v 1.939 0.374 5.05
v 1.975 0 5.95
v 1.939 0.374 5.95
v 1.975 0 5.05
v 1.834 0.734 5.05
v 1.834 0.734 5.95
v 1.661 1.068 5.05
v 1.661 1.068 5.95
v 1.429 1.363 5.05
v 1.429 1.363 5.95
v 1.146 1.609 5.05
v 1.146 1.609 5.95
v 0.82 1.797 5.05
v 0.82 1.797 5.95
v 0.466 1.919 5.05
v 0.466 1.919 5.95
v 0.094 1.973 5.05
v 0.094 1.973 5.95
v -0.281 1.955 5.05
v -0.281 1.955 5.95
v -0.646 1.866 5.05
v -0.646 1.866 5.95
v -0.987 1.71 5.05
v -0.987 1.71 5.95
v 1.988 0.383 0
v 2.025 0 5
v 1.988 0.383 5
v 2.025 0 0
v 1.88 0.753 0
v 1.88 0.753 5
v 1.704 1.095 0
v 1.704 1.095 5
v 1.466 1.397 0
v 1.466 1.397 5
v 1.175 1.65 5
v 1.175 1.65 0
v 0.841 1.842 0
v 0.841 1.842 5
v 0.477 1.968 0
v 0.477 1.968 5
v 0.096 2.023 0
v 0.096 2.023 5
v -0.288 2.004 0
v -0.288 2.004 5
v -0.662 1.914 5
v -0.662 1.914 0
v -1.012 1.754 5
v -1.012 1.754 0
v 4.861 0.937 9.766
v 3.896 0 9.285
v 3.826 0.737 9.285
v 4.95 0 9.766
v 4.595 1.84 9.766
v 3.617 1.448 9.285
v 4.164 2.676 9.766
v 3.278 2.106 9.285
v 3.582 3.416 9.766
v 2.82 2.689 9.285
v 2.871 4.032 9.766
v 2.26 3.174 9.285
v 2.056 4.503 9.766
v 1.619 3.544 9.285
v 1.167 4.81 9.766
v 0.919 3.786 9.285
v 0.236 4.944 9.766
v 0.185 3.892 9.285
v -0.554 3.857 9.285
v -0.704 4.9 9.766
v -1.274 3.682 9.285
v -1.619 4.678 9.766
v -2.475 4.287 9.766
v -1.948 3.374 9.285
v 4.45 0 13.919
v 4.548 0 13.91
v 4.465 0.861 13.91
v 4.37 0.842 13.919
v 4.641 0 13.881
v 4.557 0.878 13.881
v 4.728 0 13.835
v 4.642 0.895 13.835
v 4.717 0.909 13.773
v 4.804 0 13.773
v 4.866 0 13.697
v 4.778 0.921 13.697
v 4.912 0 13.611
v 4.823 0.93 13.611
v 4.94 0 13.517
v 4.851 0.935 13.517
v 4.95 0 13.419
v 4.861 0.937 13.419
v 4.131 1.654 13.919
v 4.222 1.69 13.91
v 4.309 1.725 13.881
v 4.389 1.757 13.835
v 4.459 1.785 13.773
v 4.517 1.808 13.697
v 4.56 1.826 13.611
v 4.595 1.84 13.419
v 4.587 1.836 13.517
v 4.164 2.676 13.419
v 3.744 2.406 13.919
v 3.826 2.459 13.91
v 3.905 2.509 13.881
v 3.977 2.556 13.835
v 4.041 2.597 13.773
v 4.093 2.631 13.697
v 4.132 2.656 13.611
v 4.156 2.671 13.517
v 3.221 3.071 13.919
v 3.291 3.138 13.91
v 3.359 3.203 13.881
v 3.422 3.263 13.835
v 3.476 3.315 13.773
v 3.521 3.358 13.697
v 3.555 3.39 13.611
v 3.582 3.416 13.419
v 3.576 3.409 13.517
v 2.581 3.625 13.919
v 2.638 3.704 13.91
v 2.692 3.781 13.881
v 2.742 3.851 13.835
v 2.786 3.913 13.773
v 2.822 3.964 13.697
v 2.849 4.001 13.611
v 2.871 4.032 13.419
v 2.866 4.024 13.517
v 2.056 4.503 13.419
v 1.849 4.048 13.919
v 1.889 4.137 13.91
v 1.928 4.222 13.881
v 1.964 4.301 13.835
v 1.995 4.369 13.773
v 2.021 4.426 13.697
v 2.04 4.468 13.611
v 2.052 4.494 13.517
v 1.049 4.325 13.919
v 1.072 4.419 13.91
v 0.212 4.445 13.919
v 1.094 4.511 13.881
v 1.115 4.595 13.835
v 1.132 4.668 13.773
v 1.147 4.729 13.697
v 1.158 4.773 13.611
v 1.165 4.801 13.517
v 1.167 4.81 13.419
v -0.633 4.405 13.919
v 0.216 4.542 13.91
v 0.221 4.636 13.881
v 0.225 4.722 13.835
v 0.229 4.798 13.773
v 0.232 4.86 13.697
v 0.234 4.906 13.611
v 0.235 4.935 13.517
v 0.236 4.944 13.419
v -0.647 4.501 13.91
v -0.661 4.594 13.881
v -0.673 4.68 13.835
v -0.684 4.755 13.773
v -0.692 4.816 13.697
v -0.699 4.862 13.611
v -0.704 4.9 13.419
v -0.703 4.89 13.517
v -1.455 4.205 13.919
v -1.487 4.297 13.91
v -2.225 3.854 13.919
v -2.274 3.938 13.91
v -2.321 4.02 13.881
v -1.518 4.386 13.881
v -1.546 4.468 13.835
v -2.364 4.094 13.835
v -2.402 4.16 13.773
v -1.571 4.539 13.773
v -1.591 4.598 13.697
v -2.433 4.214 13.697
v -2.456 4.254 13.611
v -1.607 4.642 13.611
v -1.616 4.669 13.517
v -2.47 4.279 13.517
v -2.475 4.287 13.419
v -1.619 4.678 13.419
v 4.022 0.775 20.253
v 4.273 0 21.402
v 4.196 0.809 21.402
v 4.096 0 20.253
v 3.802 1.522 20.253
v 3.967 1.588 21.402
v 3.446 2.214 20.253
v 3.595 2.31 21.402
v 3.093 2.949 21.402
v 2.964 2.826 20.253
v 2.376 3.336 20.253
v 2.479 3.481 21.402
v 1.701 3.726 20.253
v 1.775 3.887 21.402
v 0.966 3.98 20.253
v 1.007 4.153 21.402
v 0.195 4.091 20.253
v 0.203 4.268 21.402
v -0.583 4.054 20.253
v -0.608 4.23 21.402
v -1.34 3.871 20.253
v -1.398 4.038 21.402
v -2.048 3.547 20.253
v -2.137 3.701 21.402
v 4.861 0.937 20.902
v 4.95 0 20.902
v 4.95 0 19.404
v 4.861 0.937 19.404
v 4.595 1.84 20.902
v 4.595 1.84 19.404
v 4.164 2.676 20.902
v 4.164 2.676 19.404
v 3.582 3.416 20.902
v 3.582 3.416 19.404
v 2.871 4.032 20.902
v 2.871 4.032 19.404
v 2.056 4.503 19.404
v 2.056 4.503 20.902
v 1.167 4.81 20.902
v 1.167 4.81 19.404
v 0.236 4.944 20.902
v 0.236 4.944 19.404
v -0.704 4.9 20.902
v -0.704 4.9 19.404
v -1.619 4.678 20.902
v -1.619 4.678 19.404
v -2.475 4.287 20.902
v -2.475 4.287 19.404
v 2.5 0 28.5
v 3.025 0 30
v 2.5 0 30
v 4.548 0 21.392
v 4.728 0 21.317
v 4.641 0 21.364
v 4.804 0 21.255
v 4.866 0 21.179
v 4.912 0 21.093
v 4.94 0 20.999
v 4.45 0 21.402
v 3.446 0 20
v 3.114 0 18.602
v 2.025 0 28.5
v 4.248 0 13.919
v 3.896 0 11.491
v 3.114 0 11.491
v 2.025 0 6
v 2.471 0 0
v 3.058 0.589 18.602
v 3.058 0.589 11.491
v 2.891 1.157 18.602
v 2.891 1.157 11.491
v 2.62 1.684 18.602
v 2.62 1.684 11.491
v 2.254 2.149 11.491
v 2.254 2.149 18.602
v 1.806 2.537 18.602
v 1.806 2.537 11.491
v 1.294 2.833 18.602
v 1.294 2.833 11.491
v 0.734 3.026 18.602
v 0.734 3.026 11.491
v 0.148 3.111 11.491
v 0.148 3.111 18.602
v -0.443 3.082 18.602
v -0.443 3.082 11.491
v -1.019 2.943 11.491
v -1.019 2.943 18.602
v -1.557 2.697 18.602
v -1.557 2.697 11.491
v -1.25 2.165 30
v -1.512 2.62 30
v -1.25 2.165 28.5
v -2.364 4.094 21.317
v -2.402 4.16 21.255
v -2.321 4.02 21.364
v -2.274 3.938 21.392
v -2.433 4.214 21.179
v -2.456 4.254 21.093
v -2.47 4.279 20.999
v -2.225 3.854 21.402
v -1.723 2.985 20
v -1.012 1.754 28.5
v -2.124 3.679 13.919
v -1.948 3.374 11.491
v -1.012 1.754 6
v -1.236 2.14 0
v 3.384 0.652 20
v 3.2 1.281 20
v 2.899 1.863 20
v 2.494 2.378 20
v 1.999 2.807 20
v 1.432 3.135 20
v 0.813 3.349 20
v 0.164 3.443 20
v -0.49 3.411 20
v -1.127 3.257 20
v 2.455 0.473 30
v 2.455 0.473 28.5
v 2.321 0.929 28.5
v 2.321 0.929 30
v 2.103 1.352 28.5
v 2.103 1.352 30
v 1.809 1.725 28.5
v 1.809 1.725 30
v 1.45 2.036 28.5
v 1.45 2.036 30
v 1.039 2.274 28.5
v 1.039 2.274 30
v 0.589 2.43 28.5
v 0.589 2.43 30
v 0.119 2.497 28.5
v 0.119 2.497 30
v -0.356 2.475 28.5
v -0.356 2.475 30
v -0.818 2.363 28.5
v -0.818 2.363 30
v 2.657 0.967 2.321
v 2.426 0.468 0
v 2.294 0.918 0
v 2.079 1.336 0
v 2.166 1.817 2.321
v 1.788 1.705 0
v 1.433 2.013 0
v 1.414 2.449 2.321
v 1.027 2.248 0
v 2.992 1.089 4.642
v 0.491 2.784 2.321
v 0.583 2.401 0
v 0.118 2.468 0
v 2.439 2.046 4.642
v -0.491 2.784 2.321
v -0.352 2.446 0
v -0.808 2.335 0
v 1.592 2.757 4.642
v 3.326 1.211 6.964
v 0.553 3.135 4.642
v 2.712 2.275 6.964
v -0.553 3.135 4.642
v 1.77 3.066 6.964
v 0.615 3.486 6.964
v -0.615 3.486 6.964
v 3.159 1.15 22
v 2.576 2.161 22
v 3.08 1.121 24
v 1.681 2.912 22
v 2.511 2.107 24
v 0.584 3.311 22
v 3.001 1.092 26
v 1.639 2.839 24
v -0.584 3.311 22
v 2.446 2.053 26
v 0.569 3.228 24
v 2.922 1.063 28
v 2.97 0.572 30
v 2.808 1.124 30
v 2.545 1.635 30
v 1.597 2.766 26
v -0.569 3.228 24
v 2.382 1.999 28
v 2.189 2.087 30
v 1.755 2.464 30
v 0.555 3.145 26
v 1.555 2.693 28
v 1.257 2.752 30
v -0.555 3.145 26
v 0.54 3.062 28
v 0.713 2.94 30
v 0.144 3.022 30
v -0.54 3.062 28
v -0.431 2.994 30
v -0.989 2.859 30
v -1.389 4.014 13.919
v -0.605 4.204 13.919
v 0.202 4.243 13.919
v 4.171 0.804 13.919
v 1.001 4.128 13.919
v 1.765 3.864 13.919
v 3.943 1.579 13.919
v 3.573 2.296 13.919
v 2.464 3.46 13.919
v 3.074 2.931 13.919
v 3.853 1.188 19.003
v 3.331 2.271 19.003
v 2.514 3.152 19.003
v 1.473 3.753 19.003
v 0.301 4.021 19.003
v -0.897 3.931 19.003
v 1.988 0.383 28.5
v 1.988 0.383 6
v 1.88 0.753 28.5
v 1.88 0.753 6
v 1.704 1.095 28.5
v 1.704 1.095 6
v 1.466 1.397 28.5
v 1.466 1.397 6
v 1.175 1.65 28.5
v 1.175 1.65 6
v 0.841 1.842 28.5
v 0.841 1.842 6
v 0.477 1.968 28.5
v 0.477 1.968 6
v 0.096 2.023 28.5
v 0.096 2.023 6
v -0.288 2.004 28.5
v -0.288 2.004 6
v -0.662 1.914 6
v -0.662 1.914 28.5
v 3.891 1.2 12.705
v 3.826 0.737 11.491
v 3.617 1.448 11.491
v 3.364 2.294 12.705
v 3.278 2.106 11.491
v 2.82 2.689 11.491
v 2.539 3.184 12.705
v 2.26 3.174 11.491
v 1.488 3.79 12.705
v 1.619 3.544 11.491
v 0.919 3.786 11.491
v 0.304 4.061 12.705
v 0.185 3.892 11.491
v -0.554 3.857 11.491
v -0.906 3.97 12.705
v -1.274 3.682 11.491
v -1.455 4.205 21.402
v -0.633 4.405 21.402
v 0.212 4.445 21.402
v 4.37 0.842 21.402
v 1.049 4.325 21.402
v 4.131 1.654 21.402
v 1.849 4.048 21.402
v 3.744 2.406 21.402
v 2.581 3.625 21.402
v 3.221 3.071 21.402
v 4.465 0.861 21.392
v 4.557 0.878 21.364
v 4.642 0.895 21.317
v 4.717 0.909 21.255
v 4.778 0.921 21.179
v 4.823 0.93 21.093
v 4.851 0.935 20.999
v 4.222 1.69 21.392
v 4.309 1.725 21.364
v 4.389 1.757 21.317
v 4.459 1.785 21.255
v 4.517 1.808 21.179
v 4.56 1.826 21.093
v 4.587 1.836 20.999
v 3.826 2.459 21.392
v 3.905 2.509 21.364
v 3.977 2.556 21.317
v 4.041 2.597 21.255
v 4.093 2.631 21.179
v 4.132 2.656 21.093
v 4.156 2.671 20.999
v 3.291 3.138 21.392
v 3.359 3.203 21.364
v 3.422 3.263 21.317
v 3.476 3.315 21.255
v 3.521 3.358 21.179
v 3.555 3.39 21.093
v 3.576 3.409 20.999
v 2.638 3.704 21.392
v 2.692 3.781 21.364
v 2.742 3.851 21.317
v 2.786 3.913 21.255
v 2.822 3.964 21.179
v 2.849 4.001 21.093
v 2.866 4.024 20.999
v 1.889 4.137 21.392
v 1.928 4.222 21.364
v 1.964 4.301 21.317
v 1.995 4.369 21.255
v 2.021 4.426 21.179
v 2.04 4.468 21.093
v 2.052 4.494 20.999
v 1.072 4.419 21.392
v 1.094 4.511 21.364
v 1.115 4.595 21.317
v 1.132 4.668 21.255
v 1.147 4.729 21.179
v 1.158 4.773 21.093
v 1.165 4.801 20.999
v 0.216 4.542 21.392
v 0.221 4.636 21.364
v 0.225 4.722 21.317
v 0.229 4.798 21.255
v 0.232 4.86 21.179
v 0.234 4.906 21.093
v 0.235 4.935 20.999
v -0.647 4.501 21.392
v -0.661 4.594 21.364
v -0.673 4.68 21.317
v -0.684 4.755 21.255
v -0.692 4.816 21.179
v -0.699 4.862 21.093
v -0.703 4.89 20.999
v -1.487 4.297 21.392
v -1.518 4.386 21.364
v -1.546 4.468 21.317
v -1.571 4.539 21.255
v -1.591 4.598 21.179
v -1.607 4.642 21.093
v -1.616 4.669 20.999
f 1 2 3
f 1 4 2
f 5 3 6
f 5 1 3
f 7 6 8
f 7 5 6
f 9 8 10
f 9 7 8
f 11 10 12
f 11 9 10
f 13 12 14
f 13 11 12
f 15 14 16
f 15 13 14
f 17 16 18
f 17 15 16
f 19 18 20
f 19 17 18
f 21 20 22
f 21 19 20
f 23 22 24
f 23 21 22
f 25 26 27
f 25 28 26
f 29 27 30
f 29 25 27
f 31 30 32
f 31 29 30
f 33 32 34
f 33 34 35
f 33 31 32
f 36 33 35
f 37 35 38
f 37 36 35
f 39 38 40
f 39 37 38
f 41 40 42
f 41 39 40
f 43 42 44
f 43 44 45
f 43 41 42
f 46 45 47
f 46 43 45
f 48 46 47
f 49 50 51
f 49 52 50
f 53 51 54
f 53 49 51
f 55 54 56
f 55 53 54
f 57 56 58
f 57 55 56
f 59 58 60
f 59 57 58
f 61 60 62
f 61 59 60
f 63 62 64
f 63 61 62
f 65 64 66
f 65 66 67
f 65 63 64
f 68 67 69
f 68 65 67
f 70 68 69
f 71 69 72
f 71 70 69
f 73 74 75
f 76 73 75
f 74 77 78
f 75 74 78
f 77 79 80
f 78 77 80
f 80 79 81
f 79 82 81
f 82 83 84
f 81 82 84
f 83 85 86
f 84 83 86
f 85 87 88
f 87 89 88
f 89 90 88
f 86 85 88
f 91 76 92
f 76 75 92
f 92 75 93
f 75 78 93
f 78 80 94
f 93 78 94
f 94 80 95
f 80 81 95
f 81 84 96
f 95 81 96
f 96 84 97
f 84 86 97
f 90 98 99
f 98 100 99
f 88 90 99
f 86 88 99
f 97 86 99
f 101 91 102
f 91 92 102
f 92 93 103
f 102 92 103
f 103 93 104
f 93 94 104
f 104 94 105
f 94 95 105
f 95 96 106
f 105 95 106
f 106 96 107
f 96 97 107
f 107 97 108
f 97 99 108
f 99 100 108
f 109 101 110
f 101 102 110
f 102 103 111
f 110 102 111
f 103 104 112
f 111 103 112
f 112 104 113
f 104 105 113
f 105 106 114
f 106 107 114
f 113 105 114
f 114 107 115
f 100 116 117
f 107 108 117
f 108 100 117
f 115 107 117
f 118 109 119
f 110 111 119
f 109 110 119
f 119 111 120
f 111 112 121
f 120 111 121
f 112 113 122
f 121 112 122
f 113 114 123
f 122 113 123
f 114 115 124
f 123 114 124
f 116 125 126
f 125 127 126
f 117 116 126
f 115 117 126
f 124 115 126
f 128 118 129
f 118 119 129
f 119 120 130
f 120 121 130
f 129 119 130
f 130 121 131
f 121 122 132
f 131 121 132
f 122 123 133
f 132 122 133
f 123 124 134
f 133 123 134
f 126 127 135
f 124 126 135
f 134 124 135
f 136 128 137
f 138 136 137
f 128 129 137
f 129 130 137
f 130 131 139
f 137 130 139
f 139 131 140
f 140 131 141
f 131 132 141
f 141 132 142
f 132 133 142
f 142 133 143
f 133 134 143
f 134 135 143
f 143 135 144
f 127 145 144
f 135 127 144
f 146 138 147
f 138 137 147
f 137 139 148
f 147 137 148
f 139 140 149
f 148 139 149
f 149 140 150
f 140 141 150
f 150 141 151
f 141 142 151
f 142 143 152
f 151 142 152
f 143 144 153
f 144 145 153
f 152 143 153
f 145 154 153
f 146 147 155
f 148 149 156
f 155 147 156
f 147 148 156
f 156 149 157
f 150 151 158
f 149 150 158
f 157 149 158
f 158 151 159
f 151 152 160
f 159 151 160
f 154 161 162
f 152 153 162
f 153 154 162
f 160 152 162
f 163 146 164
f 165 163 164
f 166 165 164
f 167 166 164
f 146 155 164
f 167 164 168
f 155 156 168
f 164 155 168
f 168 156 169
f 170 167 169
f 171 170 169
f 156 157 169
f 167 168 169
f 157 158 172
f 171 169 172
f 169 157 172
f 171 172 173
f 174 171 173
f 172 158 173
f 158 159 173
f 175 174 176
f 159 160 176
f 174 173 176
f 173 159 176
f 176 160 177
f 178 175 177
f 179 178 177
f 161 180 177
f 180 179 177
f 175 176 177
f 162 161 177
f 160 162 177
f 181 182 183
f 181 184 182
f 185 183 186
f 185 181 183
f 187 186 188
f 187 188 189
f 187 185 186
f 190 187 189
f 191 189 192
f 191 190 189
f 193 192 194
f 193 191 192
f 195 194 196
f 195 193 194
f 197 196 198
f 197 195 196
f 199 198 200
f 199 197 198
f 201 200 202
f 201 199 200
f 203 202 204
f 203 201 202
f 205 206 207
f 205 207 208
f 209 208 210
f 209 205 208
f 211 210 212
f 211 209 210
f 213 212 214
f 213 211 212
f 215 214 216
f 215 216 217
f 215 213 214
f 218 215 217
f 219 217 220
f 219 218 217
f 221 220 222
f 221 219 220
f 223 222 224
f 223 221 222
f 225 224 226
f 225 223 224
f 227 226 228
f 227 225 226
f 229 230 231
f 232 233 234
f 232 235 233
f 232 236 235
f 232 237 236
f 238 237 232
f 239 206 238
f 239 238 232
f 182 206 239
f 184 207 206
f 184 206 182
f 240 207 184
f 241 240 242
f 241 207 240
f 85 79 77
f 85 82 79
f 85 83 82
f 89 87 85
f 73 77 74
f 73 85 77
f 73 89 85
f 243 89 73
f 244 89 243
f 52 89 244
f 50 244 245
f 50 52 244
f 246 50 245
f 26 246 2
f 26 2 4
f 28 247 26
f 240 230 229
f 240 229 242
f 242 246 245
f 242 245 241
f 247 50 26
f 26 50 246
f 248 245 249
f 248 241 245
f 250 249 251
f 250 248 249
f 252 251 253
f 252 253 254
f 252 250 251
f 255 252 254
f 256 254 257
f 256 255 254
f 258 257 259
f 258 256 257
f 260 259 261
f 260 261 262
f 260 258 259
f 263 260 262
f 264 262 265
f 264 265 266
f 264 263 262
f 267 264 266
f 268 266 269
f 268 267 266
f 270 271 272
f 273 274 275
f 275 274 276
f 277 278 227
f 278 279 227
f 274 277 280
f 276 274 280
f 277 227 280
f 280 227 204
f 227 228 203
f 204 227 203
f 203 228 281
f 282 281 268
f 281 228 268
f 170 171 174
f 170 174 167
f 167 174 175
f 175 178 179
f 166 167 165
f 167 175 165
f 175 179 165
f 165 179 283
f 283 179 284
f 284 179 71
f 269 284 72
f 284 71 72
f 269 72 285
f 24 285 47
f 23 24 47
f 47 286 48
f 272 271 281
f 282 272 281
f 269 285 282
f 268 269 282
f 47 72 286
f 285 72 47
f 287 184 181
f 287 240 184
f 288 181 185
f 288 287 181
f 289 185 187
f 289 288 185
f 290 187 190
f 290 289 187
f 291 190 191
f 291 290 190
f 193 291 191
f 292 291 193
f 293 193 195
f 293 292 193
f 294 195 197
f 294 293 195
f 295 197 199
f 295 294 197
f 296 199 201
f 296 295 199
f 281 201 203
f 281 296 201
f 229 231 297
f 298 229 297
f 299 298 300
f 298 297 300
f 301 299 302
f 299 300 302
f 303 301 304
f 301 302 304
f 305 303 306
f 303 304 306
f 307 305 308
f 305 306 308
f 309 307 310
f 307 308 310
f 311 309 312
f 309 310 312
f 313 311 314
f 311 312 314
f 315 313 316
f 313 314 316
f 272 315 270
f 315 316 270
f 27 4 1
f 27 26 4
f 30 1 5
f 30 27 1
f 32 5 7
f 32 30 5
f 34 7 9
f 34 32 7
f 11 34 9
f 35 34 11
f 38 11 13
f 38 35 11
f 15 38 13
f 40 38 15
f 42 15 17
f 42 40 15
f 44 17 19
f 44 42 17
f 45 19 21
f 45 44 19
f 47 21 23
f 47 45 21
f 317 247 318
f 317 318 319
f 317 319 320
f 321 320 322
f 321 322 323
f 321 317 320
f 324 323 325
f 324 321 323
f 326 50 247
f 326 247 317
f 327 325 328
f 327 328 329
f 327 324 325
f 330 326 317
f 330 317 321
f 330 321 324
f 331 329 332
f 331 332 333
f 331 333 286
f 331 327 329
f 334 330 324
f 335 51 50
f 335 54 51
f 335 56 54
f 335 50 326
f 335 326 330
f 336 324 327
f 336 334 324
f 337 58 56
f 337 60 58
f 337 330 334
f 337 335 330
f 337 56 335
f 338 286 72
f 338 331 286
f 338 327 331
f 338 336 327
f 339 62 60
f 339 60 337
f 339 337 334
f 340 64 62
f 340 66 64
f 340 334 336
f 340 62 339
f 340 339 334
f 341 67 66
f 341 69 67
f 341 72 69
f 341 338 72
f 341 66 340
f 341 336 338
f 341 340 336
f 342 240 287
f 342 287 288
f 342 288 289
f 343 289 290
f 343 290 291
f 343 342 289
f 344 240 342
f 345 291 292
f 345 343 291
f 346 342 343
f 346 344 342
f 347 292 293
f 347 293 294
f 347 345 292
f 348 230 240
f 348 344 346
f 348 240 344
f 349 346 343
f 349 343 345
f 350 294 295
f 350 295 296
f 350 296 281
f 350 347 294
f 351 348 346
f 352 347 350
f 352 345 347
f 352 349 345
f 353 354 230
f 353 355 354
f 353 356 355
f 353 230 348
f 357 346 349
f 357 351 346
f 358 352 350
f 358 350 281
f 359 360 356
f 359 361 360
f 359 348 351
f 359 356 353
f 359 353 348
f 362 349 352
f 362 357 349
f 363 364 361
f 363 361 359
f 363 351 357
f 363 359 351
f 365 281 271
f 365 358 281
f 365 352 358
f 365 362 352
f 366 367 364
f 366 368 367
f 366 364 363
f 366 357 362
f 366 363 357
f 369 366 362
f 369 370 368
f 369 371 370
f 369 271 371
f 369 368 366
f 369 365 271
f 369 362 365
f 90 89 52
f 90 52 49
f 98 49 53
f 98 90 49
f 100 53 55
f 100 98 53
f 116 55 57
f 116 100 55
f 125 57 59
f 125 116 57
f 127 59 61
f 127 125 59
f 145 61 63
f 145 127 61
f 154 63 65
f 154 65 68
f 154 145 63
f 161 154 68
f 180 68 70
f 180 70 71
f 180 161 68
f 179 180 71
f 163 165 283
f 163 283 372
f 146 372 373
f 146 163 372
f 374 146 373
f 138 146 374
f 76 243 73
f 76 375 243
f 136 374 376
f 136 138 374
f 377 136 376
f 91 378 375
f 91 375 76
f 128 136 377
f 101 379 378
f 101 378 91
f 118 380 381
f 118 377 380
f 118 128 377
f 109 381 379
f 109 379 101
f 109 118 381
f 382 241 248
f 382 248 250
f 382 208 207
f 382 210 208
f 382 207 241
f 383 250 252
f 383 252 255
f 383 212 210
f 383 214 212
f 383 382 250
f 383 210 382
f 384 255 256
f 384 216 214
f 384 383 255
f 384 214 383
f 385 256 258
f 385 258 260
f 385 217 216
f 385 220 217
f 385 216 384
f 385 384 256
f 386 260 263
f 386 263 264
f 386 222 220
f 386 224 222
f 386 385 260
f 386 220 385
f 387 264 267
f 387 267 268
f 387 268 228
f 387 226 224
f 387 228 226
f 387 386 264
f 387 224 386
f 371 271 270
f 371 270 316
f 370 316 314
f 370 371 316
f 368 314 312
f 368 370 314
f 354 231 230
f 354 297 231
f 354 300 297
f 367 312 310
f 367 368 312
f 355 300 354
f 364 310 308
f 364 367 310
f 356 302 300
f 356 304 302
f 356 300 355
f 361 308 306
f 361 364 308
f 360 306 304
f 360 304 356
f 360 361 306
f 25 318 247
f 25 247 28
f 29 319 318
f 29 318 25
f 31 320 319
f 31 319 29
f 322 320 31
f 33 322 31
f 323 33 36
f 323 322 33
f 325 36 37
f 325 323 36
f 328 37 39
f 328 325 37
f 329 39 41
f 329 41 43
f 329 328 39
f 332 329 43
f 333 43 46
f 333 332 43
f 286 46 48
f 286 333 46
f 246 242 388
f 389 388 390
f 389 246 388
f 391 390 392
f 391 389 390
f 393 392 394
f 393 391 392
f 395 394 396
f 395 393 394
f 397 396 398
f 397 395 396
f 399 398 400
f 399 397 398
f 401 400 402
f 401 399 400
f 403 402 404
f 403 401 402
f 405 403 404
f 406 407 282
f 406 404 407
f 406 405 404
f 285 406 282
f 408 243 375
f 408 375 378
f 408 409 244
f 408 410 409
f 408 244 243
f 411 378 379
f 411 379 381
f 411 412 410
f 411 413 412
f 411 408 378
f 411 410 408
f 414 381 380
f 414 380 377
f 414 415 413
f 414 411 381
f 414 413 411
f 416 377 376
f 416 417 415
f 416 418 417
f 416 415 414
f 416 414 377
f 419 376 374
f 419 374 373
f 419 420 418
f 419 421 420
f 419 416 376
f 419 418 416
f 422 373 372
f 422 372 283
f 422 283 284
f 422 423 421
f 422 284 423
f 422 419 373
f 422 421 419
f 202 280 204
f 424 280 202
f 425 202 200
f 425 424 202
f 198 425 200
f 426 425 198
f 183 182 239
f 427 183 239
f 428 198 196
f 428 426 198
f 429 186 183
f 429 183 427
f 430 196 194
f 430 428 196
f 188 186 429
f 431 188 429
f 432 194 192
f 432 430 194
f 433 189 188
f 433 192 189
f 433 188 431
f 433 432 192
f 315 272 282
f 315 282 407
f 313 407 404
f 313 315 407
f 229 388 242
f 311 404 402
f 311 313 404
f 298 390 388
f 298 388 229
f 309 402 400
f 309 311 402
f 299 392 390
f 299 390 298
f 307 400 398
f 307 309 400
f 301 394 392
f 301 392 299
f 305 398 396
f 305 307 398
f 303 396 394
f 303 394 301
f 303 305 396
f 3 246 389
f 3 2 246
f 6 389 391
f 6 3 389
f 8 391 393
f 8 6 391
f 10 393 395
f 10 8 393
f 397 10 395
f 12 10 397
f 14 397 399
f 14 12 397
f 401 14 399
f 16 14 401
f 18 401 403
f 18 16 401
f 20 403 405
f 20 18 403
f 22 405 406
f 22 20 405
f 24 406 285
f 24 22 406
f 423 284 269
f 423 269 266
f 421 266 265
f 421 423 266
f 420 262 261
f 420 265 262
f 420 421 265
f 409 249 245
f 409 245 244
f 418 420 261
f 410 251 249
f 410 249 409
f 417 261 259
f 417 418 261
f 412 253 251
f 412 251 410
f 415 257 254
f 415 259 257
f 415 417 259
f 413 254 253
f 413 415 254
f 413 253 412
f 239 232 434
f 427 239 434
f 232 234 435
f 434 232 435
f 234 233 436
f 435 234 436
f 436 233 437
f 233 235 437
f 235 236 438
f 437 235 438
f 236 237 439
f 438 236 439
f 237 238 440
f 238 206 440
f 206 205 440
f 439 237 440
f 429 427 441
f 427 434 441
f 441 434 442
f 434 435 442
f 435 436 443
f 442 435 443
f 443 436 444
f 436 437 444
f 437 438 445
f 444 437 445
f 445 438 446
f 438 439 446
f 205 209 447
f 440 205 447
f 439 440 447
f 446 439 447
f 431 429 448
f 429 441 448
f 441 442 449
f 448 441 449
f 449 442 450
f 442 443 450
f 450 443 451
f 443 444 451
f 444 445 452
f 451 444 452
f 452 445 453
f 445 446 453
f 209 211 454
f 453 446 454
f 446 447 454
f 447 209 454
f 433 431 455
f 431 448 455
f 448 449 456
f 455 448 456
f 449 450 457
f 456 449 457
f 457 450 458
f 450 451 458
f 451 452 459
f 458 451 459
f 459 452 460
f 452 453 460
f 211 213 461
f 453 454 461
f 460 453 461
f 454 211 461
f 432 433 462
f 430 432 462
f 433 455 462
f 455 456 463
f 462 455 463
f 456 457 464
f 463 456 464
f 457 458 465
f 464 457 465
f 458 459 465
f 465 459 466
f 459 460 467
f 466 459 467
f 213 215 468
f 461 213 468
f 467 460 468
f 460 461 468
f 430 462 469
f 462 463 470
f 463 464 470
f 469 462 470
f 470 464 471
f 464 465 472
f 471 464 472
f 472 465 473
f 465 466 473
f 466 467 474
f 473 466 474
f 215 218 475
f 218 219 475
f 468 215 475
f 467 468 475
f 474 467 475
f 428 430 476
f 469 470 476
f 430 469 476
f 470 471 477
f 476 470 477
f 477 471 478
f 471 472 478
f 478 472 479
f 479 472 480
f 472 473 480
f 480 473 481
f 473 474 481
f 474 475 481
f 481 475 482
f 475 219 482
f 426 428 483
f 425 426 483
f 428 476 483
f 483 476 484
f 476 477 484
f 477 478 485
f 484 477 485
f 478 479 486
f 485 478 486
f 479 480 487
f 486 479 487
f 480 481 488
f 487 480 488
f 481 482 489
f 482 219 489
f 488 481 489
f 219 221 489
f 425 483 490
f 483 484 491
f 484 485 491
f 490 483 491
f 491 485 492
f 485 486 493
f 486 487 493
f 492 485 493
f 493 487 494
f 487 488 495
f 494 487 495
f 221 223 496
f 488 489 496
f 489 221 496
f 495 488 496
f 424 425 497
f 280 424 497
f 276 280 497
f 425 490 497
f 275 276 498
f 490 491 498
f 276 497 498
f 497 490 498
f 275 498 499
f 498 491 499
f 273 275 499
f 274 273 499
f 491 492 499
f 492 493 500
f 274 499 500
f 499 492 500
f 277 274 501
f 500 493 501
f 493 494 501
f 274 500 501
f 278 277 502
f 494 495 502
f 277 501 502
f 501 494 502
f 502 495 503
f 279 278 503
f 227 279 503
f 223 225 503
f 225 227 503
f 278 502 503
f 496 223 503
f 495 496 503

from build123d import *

# Parameters (mm, degrees)
REVOLVE_1_ANGLE     = 120
SKETCH_3_R          = 2.5
CUT_EXTRUDE_1_DEPTH = 1.5
FILLET_1_R          = 0.5


with BuildPart() as part:
    # 스케치2 → 회전1 (revolve)
    with BuildSketch(Plane(origin=(0, 0, 0), x_dir=(1, 0, 0), z_dir=(0, 1, 0))):
        Polygon((3.025, -30), (2.025, -30), (2.025, -6), (1.975, -5.95), (1.975, -5.05), (2.025, -5), (2.025, 0), (2.471154323, 0), (3.896197522, -9.284948012), (4.95, -9.76632184), (4.95, -13.919413001), (4.247678793, -13.919413001), (3.896197522, -11.490595407), (3.114172222, -11.490595407), (3.114172222, -18.601840787), (4.95, -19.404070604), (4.95, -21.401570634), (4.273015674, -21.401570634), (4.095786722, -20.253069256), (3.446467915, -20), align=None)
    revolve(axis=Axis((0, 0, 0), (0, 0, 1)), revolution_arc=REVOLVE_1_ANGLE)

    # 스케치3 → 컷-돌출1 (cut)
    with BuildSketch(Plane.XY.offset(30)):
        Circle(SKETCH_3_R)
    extrude(amount=-CUT_EXTRUDE_1_DEPTH, mode=Mode.SUBTRACT)

    # 필렛1
    fillet_1_edges = [part.edges().sort_by_distance(p)[0] for p in [
        (2.475, 4.286825749, 13.919413001),
        (2.475, 4.286825749, 21.401570634),
    ]]
    fillet(fillet_1_edges, radius=FILLET_1_R)


solid = part.part
